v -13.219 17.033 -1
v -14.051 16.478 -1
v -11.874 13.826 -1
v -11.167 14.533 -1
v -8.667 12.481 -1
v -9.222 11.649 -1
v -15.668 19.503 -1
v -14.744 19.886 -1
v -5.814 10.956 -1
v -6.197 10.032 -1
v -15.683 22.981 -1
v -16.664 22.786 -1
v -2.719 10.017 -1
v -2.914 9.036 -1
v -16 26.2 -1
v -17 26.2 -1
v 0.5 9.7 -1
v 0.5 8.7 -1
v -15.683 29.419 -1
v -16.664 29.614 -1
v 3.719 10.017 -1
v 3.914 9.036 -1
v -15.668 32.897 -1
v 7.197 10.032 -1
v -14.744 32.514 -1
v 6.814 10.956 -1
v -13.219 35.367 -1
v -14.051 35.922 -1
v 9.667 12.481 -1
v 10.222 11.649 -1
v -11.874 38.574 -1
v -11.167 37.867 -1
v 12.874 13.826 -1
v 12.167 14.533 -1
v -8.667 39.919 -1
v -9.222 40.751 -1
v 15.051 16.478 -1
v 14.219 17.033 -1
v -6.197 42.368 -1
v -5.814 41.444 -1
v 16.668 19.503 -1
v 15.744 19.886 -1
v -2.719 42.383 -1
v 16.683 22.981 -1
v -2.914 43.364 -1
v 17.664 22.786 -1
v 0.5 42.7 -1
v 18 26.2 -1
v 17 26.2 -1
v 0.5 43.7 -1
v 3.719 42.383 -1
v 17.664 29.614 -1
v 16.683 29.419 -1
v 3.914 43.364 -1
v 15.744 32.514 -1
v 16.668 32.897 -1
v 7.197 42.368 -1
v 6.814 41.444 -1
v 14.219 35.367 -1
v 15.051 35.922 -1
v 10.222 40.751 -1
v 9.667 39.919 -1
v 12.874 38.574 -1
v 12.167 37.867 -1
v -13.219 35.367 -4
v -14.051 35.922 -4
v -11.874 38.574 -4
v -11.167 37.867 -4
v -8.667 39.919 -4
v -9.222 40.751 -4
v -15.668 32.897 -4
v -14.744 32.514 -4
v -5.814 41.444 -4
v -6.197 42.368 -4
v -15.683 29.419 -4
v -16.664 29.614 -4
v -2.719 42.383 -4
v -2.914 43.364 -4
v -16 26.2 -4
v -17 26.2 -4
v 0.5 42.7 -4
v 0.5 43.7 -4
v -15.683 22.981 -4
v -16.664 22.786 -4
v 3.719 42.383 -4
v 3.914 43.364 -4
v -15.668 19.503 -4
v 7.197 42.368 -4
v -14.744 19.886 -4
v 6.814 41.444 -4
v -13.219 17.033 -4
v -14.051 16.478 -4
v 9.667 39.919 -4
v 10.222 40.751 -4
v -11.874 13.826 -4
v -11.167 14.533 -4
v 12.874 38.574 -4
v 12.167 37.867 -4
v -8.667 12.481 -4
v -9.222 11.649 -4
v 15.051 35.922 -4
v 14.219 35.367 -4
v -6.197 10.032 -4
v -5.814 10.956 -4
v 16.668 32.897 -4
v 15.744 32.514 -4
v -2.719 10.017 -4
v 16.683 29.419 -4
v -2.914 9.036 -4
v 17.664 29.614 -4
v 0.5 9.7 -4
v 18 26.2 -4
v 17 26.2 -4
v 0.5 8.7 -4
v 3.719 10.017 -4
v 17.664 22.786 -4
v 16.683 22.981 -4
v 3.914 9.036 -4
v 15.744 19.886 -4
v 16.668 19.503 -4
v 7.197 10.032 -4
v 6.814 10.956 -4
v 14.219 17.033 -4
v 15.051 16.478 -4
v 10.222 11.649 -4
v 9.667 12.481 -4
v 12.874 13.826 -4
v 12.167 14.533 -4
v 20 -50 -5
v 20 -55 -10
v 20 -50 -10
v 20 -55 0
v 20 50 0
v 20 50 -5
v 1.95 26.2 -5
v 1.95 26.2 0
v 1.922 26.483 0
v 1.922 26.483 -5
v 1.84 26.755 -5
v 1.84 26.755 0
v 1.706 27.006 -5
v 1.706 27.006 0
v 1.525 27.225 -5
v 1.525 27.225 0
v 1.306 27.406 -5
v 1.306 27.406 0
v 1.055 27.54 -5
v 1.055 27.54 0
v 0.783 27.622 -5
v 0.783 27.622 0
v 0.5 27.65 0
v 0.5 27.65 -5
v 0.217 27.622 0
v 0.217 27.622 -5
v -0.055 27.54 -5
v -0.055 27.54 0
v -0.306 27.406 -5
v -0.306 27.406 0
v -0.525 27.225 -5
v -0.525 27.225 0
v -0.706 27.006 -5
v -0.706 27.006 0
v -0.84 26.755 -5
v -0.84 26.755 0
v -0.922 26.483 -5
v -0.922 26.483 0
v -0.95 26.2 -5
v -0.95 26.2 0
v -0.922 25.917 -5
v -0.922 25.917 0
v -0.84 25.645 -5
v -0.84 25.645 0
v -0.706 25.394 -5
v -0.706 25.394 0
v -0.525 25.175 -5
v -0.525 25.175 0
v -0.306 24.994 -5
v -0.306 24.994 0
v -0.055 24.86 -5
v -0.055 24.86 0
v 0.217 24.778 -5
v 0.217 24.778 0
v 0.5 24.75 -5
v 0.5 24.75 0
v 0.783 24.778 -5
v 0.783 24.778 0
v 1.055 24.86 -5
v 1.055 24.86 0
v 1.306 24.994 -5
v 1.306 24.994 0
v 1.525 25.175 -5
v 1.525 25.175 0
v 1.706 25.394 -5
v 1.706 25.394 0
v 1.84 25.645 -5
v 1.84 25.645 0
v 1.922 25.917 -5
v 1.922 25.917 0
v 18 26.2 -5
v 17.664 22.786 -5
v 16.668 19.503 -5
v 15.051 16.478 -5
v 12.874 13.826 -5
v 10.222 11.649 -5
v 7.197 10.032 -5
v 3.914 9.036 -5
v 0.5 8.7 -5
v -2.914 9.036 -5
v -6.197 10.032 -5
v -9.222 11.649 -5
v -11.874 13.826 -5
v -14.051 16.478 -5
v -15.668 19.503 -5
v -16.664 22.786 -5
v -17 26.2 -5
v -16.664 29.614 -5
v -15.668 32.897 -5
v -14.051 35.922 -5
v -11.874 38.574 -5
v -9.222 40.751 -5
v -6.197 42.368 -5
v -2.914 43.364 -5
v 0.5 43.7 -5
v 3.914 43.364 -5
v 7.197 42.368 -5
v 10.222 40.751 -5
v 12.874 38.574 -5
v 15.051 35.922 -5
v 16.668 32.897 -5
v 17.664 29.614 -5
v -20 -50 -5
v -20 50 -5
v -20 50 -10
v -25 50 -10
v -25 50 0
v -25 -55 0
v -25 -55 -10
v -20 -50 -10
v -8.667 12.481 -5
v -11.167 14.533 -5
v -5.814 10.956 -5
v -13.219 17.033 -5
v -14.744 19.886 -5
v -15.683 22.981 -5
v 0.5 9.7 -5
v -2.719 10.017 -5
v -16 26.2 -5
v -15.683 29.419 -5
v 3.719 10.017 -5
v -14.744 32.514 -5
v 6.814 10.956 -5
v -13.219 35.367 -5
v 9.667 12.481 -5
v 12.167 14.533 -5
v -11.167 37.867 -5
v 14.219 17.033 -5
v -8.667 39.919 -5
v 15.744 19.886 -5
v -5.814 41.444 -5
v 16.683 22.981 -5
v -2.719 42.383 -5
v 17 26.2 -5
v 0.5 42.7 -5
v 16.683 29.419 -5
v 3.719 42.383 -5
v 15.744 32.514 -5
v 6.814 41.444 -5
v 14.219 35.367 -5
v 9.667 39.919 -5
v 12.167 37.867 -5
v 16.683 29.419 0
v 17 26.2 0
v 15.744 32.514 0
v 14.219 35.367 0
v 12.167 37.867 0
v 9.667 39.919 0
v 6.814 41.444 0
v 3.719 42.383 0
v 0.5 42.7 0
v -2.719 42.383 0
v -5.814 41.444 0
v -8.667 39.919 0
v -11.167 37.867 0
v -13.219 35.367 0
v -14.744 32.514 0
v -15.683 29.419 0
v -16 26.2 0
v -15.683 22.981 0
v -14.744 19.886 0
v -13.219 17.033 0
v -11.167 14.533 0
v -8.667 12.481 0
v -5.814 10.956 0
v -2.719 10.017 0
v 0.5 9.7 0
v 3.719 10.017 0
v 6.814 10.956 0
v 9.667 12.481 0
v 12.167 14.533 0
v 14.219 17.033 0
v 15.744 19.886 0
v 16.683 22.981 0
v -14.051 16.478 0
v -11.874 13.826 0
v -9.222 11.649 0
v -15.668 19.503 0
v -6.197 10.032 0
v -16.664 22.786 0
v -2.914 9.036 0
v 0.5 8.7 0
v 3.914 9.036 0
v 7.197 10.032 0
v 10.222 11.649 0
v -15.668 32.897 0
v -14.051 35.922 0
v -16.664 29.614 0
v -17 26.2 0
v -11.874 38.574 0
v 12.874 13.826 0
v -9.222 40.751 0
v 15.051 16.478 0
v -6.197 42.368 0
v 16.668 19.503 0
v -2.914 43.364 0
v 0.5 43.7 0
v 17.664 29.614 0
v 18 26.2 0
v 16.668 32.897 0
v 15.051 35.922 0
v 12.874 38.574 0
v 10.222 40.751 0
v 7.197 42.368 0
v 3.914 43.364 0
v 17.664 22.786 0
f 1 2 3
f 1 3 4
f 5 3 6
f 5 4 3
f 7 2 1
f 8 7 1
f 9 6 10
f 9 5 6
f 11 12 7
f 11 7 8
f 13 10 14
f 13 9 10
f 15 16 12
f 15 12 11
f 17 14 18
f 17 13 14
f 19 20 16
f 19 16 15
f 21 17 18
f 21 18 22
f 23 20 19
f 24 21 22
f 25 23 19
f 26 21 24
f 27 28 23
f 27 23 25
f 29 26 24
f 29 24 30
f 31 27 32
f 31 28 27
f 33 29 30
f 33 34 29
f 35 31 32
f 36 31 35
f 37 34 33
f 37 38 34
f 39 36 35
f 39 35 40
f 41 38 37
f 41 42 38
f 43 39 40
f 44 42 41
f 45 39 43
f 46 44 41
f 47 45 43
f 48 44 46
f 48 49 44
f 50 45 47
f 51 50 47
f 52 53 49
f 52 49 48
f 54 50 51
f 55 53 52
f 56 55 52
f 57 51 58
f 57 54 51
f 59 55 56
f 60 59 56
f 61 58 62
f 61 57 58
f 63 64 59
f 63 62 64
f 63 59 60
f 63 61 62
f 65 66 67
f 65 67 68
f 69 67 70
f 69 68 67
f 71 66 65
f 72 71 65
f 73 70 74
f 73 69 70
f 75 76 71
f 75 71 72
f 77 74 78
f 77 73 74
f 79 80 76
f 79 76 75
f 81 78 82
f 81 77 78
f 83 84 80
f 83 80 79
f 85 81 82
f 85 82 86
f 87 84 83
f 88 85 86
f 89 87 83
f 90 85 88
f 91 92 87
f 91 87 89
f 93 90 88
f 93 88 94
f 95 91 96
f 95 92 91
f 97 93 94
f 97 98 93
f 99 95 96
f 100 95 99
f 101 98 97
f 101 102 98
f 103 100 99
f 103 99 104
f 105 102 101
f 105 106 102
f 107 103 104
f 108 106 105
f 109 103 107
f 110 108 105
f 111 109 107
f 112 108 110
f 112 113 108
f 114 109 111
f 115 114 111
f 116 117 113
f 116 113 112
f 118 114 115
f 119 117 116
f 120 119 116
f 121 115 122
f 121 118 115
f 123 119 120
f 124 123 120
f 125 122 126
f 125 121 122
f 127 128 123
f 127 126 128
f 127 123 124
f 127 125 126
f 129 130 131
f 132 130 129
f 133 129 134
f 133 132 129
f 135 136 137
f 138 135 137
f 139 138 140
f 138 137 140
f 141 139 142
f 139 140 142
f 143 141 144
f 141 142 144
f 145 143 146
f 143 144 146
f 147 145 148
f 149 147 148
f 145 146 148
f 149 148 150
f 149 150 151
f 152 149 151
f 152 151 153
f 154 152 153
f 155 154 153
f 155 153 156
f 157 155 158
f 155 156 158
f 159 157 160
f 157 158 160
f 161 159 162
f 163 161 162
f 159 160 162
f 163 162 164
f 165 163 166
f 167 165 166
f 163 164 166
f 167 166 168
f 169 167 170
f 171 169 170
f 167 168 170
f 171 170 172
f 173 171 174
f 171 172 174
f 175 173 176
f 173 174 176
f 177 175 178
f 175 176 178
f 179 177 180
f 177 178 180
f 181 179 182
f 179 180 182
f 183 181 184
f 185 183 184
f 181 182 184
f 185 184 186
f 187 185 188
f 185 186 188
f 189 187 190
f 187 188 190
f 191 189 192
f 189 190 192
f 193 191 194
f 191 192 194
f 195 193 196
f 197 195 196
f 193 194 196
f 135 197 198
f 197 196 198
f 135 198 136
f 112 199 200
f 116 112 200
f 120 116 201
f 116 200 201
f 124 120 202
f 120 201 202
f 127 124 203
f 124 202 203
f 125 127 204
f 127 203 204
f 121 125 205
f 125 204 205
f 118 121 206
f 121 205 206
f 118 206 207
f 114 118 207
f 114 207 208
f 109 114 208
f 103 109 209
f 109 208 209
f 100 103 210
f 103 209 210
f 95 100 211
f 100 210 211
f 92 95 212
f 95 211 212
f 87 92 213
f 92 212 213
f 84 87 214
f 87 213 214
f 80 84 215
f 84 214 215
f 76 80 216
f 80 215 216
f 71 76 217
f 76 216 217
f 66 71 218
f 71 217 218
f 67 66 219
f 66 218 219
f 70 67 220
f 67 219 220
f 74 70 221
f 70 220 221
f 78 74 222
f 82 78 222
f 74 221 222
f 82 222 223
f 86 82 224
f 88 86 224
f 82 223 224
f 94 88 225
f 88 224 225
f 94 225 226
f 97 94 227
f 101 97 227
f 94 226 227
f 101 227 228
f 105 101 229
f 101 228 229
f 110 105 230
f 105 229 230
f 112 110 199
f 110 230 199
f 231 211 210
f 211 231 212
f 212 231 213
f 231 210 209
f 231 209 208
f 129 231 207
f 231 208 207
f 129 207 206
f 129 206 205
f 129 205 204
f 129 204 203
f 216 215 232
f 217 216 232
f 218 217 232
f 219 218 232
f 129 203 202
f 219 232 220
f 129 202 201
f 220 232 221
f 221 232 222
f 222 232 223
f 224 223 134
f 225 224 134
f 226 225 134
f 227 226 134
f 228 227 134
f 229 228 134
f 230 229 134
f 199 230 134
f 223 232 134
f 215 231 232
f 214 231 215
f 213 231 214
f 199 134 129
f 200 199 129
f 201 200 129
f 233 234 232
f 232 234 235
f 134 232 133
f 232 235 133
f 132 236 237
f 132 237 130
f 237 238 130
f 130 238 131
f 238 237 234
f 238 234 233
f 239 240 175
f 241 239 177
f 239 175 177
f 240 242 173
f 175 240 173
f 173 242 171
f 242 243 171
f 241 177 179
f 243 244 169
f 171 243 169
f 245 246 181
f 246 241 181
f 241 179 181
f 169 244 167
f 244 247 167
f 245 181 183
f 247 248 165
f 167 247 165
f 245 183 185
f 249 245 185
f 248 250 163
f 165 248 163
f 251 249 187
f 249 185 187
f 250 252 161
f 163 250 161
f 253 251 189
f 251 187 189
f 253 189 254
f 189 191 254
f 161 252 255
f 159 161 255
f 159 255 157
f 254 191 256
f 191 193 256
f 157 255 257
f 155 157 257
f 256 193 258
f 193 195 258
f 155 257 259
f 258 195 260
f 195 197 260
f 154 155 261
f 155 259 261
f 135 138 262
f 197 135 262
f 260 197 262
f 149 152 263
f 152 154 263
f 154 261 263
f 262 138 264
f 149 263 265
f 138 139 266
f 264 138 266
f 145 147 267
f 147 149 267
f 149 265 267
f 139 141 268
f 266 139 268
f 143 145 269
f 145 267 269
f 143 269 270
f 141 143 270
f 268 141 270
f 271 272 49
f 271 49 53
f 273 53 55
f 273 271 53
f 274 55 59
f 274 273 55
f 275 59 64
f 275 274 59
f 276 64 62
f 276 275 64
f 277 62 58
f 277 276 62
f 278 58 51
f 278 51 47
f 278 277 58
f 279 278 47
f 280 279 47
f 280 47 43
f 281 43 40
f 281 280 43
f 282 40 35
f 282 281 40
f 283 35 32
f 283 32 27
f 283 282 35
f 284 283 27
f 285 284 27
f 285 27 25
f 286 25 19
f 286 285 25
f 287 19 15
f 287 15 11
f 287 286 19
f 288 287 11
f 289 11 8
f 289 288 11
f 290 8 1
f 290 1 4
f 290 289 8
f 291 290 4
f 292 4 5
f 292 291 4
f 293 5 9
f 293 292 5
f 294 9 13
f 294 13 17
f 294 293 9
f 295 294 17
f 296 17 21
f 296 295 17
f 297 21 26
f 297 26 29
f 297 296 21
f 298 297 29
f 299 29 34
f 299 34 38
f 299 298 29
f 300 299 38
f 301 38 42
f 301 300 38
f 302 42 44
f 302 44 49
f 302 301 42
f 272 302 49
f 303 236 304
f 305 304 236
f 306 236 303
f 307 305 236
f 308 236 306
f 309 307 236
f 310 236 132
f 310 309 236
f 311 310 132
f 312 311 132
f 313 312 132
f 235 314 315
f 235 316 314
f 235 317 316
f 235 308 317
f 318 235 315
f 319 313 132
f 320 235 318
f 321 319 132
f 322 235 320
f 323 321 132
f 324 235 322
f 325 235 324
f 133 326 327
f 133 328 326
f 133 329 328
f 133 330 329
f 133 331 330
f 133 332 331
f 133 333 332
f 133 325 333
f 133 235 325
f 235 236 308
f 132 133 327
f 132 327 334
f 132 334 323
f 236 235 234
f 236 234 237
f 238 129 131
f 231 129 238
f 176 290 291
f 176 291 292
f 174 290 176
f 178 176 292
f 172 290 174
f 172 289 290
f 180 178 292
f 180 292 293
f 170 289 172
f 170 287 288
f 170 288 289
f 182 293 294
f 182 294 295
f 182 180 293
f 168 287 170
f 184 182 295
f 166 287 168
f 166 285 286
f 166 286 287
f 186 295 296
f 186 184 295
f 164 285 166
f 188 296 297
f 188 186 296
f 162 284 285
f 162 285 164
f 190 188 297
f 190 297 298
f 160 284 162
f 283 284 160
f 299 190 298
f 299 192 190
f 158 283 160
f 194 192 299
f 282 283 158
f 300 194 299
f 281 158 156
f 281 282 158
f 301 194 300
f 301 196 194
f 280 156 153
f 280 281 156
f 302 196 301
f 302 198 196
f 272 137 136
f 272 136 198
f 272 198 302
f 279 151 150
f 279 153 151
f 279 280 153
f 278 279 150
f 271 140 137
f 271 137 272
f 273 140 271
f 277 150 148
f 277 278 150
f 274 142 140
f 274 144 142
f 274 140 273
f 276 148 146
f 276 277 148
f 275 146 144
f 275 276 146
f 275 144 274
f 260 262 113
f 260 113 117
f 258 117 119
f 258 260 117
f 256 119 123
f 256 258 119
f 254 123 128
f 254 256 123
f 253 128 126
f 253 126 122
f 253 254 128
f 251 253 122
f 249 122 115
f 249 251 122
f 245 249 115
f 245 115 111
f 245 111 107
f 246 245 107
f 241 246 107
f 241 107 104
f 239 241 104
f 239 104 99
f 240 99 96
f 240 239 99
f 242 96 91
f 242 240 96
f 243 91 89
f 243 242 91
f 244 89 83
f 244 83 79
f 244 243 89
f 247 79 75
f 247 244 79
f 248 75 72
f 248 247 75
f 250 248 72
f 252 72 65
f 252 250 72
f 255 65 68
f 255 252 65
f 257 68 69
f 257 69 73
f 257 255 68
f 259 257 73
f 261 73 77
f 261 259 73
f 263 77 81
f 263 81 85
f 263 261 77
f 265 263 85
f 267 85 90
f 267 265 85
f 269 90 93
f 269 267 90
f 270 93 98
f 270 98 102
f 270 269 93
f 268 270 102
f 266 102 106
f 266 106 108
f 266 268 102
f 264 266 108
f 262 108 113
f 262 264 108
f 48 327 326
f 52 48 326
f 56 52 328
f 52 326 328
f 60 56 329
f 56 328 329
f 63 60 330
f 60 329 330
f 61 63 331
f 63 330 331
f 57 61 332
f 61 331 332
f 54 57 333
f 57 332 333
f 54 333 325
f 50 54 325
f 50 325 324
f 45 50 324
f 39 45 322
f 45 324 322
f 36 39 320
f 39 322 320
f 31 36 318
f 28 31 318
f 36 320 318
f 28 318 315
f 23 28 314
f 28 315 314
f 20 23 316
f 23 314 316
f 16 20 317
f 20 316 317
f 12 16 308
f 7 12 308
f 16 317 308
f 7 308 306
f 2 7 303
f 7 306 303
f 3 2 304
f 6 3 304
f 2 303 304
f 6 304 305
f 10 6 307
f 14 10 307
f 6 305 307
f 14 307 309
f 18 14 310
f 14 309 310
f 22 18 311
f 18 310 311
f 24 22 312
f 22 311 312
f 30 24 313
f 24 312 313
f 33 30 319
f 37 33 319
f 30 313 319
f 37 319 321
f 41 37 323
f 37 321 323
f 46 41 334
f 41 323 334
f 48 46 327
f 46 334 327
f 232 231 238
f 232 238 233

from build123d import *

# Parameters (mm, degrees)
F0_W     = 40
F0_H     = 100
F0_R     = 17.5
F0_R_2   = 1.45
F1_DEPTH = 5
F2_W     = 5
F2_H     = 100
F3_DEPTH = 10
F4_R     = 17.5
F4_R_2   = 16.5
F5_DEPTH = 1
F6_R     = 17.5
F6_R_2   = 16.5
F7_DEPTH = 1


with BuildPart() as f1:
    # F0 (on Top) → F1 (new body)
    with BuildSketch(Plane.XY):
        Rectangle(F0_W, F0_H)
        with Locations((0.5, 26.2)):
            Circle(F0_R, mode=Mode.SUBTRACT)
        with Locations((0.5, 26.2)):
            Circle(F0_R)
        with Locations((0.5, 26.2)):
            Circle(F0_R_2, mode=Mode.SUBTRACT)
    extrude(amount=-F1_DEPTH)

    # F2 (on face) → F3 (join)
    with BuildSketch(Plane.XY):
        with Locations((-22.5, 0)):
            Rectangle(F2_W, F2_H)
        Polygon((20, -50), (-20, -50), (-25, -50), (-25, -55), (20, -55), align=None)
    extrude(amount=-F3_DEPTH)

    # F4 (on face) → F5 (cut)
    with BuildSketch(Plane.XY):
        with Locations((0.5, 26.2)):
            Circle(F4_R)
        with Locations((0.5, 26.2)):
            Circle(F4_R_2, mode=Mode.SUBTRACT)
    extrude(amount=-F5_DEPTH, mode=Mode.SUBTRACT)

    # F6 (on face) → F7 (cut)
    with BuildSketch(Plane(origin=(0, 0, -5), x_dir=(1, 0, 0), z_dir=(0, 0, -1))):
        with Locations((0.5, -26.2)):
            Circle(F6_R)
        with Locations((0.5, -26.2)):
            Circle(F6_R_2, mode=Mode.SUBTRACT)
    extrude(amount=-F7_DEPTH, mode=Mode.SUBTRACT)


solid = f1.part
